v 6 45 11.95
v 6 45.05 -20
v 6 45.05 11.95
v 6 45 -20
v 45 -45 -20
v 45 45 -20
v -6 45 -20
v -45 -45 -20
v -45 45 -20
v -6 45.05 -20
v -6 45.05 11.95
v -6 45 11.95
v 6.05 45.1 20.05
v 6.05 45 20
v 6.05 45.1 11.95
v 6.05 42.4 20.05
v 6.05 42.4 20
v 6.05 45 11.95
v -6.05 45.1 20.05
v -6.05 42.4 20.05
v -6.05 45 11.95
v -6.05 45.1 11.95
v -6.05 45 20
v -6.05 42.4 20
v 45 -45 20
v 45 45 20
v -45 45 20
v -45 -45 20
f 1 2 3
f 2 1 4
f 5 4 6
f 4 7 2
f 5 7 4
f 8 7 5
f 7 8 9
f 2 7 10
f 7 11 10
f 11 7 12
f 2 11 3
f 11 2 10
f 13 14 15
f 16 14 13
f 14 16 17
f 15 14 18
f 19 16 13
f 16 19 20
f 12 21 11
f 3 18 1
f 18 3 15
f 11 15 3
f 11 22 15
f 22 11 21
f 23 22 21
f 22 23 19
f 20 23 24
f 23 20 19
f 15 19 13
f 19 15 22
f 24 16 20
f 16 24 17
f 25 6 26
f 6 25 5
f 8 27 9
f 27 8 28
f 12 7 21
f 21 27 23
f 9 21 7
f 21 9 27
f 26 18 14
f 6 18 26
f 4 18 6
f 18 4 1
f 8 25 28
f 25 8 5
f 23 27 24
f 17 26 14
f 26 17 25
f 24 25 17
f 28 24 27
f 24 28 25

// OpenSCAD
// Dimensions for DIY Magnetic Stirrer Housing
// Units: mm

// Overall Dimensions
outer_x = 90;
outer_y = 90;
wall_thickness = 2.5;
top_plate_thickness = 2;

// Fan Mounting Pattern
fan_hole_spacing = 71.5;
fan_hole_diameter = 4.5;
fan_hole_offset = (fan_hole_spacing - fan_hole_diameter) / 2;

// Cable Notch
notch_width = 12;
notch_depth = 8;
notch_z_start = 32; // From open edge (z=40) downwards

// Derived Dimensions
inner_x = outer_x - (wall_thickness * 2);
inner_y = outer_y - (wall_thickness * 2);
inner_z = 40;

// Fan hole coordinates (centered on 0,0)
fan_holes = [
    [-fan_hole_offset, -fan_hole_offset],
    [fan_hole_offset, -fan_hole_offset],
    [-fan_hole_offset, fan_hole_offset],
    [fan_hole_offset, fan_hole_offset]
];

$fn = 64;

// Main Housing Assembly
module stirrer_housing() {
    union() {
        // 1. Top Plate (Base)
        // The prompt specifies the top plate lies on the bed (z=0 to 2).
        // We model it centered at z=0.
        translate([0, 0, 0])
            cube([outer_x, outer_y, top_plate_thickness], center = true);

        // 2. Walls
        // The prompt specifies walls rise from the top plate to z=40.
        // We model the walls starting at z=0.
        
        // Create the solid block for walls
        wall_block_x = outer_x;
        wall_block_y = outer_y;
        
        // We need to cut the top plate out of the walls, so we start with
        // a block that includes the top plate thickness, then subtract it.
        // However, the prompt says "walls rise from it". 
        // To ensure the top plate is exactly 2mm thick and walls start at z=0,
        // we will model the walls starting at z=0.
        
        // Wall Block (Full height)
        translate([0, 0, 0])
            cube([wall_block_x, wall_block_y, inner_z], center = true);

        // Cut out the top plate from the wall block
        // This creates the cavity where the top plate sits, leaving the walls
        // rising from z=0.
        translate([0, 0, top_plate_thickness / 2])
            cube([outer_x, outer_y, top_plate_thickness + 0.1], center = true);

        // 3. Fan Mounting Holes
        // Cut holes through the top plate and walls
        for (pos = fan_holes) {
            translate([pos[0], pos[1], top_plate_thickness / 2])
                cylinder(d = fan_hole_diameter + 0.1, h = top_plate_thickness + 0.1, center = true);
        }

        // 4. Cable Notch
        // Located on one wall (e.g., the wall at +Y)
        // The notch is 12mm wide, centered along the wall.
        // It reaches 8mm down from the open edge (z=40).
        // So it spans z = 32 to 40.
        
        // Position the notch on the +Y wall
        // The wall is at y = outer_y/2 - wall_thickness/2
        notch_y_pos = (outer_y / 2) - (wall_thickness / 2);
        
        // The notch is centered along the wall (X axis)
        notch_x_pos = 0;
        
        // The notch depth is 8mm. 
        // Since the wall thickness is 2.5mm, the notch cuts through the wall.
        // We cut a rectangular slot.
        
        translate([notch_x_pos, notch_y_pos, 0]) {
            // We cut a slot that goes from z=0 up to z=40.
            // But we only want it to be 8mm deep (32 to 40).
            // We cut a tall slot and then subtract the bottom part.
            
            // Cut the tall slot
            translate([0, 0, 0])
                cube([notch_width, wall_thickness + 0.1, inner_z], center = true);
            
            // Subtract the bottom part to make it 8mm deep
            translate([0, 0, (inner_z - notch_depth) / 2])
                cube([notch_width + 0.1, wall_thickness + 0.2, notch_depth + 0.1], center = true);
        }
    }
}

// Render the part
stirrer_housing();
